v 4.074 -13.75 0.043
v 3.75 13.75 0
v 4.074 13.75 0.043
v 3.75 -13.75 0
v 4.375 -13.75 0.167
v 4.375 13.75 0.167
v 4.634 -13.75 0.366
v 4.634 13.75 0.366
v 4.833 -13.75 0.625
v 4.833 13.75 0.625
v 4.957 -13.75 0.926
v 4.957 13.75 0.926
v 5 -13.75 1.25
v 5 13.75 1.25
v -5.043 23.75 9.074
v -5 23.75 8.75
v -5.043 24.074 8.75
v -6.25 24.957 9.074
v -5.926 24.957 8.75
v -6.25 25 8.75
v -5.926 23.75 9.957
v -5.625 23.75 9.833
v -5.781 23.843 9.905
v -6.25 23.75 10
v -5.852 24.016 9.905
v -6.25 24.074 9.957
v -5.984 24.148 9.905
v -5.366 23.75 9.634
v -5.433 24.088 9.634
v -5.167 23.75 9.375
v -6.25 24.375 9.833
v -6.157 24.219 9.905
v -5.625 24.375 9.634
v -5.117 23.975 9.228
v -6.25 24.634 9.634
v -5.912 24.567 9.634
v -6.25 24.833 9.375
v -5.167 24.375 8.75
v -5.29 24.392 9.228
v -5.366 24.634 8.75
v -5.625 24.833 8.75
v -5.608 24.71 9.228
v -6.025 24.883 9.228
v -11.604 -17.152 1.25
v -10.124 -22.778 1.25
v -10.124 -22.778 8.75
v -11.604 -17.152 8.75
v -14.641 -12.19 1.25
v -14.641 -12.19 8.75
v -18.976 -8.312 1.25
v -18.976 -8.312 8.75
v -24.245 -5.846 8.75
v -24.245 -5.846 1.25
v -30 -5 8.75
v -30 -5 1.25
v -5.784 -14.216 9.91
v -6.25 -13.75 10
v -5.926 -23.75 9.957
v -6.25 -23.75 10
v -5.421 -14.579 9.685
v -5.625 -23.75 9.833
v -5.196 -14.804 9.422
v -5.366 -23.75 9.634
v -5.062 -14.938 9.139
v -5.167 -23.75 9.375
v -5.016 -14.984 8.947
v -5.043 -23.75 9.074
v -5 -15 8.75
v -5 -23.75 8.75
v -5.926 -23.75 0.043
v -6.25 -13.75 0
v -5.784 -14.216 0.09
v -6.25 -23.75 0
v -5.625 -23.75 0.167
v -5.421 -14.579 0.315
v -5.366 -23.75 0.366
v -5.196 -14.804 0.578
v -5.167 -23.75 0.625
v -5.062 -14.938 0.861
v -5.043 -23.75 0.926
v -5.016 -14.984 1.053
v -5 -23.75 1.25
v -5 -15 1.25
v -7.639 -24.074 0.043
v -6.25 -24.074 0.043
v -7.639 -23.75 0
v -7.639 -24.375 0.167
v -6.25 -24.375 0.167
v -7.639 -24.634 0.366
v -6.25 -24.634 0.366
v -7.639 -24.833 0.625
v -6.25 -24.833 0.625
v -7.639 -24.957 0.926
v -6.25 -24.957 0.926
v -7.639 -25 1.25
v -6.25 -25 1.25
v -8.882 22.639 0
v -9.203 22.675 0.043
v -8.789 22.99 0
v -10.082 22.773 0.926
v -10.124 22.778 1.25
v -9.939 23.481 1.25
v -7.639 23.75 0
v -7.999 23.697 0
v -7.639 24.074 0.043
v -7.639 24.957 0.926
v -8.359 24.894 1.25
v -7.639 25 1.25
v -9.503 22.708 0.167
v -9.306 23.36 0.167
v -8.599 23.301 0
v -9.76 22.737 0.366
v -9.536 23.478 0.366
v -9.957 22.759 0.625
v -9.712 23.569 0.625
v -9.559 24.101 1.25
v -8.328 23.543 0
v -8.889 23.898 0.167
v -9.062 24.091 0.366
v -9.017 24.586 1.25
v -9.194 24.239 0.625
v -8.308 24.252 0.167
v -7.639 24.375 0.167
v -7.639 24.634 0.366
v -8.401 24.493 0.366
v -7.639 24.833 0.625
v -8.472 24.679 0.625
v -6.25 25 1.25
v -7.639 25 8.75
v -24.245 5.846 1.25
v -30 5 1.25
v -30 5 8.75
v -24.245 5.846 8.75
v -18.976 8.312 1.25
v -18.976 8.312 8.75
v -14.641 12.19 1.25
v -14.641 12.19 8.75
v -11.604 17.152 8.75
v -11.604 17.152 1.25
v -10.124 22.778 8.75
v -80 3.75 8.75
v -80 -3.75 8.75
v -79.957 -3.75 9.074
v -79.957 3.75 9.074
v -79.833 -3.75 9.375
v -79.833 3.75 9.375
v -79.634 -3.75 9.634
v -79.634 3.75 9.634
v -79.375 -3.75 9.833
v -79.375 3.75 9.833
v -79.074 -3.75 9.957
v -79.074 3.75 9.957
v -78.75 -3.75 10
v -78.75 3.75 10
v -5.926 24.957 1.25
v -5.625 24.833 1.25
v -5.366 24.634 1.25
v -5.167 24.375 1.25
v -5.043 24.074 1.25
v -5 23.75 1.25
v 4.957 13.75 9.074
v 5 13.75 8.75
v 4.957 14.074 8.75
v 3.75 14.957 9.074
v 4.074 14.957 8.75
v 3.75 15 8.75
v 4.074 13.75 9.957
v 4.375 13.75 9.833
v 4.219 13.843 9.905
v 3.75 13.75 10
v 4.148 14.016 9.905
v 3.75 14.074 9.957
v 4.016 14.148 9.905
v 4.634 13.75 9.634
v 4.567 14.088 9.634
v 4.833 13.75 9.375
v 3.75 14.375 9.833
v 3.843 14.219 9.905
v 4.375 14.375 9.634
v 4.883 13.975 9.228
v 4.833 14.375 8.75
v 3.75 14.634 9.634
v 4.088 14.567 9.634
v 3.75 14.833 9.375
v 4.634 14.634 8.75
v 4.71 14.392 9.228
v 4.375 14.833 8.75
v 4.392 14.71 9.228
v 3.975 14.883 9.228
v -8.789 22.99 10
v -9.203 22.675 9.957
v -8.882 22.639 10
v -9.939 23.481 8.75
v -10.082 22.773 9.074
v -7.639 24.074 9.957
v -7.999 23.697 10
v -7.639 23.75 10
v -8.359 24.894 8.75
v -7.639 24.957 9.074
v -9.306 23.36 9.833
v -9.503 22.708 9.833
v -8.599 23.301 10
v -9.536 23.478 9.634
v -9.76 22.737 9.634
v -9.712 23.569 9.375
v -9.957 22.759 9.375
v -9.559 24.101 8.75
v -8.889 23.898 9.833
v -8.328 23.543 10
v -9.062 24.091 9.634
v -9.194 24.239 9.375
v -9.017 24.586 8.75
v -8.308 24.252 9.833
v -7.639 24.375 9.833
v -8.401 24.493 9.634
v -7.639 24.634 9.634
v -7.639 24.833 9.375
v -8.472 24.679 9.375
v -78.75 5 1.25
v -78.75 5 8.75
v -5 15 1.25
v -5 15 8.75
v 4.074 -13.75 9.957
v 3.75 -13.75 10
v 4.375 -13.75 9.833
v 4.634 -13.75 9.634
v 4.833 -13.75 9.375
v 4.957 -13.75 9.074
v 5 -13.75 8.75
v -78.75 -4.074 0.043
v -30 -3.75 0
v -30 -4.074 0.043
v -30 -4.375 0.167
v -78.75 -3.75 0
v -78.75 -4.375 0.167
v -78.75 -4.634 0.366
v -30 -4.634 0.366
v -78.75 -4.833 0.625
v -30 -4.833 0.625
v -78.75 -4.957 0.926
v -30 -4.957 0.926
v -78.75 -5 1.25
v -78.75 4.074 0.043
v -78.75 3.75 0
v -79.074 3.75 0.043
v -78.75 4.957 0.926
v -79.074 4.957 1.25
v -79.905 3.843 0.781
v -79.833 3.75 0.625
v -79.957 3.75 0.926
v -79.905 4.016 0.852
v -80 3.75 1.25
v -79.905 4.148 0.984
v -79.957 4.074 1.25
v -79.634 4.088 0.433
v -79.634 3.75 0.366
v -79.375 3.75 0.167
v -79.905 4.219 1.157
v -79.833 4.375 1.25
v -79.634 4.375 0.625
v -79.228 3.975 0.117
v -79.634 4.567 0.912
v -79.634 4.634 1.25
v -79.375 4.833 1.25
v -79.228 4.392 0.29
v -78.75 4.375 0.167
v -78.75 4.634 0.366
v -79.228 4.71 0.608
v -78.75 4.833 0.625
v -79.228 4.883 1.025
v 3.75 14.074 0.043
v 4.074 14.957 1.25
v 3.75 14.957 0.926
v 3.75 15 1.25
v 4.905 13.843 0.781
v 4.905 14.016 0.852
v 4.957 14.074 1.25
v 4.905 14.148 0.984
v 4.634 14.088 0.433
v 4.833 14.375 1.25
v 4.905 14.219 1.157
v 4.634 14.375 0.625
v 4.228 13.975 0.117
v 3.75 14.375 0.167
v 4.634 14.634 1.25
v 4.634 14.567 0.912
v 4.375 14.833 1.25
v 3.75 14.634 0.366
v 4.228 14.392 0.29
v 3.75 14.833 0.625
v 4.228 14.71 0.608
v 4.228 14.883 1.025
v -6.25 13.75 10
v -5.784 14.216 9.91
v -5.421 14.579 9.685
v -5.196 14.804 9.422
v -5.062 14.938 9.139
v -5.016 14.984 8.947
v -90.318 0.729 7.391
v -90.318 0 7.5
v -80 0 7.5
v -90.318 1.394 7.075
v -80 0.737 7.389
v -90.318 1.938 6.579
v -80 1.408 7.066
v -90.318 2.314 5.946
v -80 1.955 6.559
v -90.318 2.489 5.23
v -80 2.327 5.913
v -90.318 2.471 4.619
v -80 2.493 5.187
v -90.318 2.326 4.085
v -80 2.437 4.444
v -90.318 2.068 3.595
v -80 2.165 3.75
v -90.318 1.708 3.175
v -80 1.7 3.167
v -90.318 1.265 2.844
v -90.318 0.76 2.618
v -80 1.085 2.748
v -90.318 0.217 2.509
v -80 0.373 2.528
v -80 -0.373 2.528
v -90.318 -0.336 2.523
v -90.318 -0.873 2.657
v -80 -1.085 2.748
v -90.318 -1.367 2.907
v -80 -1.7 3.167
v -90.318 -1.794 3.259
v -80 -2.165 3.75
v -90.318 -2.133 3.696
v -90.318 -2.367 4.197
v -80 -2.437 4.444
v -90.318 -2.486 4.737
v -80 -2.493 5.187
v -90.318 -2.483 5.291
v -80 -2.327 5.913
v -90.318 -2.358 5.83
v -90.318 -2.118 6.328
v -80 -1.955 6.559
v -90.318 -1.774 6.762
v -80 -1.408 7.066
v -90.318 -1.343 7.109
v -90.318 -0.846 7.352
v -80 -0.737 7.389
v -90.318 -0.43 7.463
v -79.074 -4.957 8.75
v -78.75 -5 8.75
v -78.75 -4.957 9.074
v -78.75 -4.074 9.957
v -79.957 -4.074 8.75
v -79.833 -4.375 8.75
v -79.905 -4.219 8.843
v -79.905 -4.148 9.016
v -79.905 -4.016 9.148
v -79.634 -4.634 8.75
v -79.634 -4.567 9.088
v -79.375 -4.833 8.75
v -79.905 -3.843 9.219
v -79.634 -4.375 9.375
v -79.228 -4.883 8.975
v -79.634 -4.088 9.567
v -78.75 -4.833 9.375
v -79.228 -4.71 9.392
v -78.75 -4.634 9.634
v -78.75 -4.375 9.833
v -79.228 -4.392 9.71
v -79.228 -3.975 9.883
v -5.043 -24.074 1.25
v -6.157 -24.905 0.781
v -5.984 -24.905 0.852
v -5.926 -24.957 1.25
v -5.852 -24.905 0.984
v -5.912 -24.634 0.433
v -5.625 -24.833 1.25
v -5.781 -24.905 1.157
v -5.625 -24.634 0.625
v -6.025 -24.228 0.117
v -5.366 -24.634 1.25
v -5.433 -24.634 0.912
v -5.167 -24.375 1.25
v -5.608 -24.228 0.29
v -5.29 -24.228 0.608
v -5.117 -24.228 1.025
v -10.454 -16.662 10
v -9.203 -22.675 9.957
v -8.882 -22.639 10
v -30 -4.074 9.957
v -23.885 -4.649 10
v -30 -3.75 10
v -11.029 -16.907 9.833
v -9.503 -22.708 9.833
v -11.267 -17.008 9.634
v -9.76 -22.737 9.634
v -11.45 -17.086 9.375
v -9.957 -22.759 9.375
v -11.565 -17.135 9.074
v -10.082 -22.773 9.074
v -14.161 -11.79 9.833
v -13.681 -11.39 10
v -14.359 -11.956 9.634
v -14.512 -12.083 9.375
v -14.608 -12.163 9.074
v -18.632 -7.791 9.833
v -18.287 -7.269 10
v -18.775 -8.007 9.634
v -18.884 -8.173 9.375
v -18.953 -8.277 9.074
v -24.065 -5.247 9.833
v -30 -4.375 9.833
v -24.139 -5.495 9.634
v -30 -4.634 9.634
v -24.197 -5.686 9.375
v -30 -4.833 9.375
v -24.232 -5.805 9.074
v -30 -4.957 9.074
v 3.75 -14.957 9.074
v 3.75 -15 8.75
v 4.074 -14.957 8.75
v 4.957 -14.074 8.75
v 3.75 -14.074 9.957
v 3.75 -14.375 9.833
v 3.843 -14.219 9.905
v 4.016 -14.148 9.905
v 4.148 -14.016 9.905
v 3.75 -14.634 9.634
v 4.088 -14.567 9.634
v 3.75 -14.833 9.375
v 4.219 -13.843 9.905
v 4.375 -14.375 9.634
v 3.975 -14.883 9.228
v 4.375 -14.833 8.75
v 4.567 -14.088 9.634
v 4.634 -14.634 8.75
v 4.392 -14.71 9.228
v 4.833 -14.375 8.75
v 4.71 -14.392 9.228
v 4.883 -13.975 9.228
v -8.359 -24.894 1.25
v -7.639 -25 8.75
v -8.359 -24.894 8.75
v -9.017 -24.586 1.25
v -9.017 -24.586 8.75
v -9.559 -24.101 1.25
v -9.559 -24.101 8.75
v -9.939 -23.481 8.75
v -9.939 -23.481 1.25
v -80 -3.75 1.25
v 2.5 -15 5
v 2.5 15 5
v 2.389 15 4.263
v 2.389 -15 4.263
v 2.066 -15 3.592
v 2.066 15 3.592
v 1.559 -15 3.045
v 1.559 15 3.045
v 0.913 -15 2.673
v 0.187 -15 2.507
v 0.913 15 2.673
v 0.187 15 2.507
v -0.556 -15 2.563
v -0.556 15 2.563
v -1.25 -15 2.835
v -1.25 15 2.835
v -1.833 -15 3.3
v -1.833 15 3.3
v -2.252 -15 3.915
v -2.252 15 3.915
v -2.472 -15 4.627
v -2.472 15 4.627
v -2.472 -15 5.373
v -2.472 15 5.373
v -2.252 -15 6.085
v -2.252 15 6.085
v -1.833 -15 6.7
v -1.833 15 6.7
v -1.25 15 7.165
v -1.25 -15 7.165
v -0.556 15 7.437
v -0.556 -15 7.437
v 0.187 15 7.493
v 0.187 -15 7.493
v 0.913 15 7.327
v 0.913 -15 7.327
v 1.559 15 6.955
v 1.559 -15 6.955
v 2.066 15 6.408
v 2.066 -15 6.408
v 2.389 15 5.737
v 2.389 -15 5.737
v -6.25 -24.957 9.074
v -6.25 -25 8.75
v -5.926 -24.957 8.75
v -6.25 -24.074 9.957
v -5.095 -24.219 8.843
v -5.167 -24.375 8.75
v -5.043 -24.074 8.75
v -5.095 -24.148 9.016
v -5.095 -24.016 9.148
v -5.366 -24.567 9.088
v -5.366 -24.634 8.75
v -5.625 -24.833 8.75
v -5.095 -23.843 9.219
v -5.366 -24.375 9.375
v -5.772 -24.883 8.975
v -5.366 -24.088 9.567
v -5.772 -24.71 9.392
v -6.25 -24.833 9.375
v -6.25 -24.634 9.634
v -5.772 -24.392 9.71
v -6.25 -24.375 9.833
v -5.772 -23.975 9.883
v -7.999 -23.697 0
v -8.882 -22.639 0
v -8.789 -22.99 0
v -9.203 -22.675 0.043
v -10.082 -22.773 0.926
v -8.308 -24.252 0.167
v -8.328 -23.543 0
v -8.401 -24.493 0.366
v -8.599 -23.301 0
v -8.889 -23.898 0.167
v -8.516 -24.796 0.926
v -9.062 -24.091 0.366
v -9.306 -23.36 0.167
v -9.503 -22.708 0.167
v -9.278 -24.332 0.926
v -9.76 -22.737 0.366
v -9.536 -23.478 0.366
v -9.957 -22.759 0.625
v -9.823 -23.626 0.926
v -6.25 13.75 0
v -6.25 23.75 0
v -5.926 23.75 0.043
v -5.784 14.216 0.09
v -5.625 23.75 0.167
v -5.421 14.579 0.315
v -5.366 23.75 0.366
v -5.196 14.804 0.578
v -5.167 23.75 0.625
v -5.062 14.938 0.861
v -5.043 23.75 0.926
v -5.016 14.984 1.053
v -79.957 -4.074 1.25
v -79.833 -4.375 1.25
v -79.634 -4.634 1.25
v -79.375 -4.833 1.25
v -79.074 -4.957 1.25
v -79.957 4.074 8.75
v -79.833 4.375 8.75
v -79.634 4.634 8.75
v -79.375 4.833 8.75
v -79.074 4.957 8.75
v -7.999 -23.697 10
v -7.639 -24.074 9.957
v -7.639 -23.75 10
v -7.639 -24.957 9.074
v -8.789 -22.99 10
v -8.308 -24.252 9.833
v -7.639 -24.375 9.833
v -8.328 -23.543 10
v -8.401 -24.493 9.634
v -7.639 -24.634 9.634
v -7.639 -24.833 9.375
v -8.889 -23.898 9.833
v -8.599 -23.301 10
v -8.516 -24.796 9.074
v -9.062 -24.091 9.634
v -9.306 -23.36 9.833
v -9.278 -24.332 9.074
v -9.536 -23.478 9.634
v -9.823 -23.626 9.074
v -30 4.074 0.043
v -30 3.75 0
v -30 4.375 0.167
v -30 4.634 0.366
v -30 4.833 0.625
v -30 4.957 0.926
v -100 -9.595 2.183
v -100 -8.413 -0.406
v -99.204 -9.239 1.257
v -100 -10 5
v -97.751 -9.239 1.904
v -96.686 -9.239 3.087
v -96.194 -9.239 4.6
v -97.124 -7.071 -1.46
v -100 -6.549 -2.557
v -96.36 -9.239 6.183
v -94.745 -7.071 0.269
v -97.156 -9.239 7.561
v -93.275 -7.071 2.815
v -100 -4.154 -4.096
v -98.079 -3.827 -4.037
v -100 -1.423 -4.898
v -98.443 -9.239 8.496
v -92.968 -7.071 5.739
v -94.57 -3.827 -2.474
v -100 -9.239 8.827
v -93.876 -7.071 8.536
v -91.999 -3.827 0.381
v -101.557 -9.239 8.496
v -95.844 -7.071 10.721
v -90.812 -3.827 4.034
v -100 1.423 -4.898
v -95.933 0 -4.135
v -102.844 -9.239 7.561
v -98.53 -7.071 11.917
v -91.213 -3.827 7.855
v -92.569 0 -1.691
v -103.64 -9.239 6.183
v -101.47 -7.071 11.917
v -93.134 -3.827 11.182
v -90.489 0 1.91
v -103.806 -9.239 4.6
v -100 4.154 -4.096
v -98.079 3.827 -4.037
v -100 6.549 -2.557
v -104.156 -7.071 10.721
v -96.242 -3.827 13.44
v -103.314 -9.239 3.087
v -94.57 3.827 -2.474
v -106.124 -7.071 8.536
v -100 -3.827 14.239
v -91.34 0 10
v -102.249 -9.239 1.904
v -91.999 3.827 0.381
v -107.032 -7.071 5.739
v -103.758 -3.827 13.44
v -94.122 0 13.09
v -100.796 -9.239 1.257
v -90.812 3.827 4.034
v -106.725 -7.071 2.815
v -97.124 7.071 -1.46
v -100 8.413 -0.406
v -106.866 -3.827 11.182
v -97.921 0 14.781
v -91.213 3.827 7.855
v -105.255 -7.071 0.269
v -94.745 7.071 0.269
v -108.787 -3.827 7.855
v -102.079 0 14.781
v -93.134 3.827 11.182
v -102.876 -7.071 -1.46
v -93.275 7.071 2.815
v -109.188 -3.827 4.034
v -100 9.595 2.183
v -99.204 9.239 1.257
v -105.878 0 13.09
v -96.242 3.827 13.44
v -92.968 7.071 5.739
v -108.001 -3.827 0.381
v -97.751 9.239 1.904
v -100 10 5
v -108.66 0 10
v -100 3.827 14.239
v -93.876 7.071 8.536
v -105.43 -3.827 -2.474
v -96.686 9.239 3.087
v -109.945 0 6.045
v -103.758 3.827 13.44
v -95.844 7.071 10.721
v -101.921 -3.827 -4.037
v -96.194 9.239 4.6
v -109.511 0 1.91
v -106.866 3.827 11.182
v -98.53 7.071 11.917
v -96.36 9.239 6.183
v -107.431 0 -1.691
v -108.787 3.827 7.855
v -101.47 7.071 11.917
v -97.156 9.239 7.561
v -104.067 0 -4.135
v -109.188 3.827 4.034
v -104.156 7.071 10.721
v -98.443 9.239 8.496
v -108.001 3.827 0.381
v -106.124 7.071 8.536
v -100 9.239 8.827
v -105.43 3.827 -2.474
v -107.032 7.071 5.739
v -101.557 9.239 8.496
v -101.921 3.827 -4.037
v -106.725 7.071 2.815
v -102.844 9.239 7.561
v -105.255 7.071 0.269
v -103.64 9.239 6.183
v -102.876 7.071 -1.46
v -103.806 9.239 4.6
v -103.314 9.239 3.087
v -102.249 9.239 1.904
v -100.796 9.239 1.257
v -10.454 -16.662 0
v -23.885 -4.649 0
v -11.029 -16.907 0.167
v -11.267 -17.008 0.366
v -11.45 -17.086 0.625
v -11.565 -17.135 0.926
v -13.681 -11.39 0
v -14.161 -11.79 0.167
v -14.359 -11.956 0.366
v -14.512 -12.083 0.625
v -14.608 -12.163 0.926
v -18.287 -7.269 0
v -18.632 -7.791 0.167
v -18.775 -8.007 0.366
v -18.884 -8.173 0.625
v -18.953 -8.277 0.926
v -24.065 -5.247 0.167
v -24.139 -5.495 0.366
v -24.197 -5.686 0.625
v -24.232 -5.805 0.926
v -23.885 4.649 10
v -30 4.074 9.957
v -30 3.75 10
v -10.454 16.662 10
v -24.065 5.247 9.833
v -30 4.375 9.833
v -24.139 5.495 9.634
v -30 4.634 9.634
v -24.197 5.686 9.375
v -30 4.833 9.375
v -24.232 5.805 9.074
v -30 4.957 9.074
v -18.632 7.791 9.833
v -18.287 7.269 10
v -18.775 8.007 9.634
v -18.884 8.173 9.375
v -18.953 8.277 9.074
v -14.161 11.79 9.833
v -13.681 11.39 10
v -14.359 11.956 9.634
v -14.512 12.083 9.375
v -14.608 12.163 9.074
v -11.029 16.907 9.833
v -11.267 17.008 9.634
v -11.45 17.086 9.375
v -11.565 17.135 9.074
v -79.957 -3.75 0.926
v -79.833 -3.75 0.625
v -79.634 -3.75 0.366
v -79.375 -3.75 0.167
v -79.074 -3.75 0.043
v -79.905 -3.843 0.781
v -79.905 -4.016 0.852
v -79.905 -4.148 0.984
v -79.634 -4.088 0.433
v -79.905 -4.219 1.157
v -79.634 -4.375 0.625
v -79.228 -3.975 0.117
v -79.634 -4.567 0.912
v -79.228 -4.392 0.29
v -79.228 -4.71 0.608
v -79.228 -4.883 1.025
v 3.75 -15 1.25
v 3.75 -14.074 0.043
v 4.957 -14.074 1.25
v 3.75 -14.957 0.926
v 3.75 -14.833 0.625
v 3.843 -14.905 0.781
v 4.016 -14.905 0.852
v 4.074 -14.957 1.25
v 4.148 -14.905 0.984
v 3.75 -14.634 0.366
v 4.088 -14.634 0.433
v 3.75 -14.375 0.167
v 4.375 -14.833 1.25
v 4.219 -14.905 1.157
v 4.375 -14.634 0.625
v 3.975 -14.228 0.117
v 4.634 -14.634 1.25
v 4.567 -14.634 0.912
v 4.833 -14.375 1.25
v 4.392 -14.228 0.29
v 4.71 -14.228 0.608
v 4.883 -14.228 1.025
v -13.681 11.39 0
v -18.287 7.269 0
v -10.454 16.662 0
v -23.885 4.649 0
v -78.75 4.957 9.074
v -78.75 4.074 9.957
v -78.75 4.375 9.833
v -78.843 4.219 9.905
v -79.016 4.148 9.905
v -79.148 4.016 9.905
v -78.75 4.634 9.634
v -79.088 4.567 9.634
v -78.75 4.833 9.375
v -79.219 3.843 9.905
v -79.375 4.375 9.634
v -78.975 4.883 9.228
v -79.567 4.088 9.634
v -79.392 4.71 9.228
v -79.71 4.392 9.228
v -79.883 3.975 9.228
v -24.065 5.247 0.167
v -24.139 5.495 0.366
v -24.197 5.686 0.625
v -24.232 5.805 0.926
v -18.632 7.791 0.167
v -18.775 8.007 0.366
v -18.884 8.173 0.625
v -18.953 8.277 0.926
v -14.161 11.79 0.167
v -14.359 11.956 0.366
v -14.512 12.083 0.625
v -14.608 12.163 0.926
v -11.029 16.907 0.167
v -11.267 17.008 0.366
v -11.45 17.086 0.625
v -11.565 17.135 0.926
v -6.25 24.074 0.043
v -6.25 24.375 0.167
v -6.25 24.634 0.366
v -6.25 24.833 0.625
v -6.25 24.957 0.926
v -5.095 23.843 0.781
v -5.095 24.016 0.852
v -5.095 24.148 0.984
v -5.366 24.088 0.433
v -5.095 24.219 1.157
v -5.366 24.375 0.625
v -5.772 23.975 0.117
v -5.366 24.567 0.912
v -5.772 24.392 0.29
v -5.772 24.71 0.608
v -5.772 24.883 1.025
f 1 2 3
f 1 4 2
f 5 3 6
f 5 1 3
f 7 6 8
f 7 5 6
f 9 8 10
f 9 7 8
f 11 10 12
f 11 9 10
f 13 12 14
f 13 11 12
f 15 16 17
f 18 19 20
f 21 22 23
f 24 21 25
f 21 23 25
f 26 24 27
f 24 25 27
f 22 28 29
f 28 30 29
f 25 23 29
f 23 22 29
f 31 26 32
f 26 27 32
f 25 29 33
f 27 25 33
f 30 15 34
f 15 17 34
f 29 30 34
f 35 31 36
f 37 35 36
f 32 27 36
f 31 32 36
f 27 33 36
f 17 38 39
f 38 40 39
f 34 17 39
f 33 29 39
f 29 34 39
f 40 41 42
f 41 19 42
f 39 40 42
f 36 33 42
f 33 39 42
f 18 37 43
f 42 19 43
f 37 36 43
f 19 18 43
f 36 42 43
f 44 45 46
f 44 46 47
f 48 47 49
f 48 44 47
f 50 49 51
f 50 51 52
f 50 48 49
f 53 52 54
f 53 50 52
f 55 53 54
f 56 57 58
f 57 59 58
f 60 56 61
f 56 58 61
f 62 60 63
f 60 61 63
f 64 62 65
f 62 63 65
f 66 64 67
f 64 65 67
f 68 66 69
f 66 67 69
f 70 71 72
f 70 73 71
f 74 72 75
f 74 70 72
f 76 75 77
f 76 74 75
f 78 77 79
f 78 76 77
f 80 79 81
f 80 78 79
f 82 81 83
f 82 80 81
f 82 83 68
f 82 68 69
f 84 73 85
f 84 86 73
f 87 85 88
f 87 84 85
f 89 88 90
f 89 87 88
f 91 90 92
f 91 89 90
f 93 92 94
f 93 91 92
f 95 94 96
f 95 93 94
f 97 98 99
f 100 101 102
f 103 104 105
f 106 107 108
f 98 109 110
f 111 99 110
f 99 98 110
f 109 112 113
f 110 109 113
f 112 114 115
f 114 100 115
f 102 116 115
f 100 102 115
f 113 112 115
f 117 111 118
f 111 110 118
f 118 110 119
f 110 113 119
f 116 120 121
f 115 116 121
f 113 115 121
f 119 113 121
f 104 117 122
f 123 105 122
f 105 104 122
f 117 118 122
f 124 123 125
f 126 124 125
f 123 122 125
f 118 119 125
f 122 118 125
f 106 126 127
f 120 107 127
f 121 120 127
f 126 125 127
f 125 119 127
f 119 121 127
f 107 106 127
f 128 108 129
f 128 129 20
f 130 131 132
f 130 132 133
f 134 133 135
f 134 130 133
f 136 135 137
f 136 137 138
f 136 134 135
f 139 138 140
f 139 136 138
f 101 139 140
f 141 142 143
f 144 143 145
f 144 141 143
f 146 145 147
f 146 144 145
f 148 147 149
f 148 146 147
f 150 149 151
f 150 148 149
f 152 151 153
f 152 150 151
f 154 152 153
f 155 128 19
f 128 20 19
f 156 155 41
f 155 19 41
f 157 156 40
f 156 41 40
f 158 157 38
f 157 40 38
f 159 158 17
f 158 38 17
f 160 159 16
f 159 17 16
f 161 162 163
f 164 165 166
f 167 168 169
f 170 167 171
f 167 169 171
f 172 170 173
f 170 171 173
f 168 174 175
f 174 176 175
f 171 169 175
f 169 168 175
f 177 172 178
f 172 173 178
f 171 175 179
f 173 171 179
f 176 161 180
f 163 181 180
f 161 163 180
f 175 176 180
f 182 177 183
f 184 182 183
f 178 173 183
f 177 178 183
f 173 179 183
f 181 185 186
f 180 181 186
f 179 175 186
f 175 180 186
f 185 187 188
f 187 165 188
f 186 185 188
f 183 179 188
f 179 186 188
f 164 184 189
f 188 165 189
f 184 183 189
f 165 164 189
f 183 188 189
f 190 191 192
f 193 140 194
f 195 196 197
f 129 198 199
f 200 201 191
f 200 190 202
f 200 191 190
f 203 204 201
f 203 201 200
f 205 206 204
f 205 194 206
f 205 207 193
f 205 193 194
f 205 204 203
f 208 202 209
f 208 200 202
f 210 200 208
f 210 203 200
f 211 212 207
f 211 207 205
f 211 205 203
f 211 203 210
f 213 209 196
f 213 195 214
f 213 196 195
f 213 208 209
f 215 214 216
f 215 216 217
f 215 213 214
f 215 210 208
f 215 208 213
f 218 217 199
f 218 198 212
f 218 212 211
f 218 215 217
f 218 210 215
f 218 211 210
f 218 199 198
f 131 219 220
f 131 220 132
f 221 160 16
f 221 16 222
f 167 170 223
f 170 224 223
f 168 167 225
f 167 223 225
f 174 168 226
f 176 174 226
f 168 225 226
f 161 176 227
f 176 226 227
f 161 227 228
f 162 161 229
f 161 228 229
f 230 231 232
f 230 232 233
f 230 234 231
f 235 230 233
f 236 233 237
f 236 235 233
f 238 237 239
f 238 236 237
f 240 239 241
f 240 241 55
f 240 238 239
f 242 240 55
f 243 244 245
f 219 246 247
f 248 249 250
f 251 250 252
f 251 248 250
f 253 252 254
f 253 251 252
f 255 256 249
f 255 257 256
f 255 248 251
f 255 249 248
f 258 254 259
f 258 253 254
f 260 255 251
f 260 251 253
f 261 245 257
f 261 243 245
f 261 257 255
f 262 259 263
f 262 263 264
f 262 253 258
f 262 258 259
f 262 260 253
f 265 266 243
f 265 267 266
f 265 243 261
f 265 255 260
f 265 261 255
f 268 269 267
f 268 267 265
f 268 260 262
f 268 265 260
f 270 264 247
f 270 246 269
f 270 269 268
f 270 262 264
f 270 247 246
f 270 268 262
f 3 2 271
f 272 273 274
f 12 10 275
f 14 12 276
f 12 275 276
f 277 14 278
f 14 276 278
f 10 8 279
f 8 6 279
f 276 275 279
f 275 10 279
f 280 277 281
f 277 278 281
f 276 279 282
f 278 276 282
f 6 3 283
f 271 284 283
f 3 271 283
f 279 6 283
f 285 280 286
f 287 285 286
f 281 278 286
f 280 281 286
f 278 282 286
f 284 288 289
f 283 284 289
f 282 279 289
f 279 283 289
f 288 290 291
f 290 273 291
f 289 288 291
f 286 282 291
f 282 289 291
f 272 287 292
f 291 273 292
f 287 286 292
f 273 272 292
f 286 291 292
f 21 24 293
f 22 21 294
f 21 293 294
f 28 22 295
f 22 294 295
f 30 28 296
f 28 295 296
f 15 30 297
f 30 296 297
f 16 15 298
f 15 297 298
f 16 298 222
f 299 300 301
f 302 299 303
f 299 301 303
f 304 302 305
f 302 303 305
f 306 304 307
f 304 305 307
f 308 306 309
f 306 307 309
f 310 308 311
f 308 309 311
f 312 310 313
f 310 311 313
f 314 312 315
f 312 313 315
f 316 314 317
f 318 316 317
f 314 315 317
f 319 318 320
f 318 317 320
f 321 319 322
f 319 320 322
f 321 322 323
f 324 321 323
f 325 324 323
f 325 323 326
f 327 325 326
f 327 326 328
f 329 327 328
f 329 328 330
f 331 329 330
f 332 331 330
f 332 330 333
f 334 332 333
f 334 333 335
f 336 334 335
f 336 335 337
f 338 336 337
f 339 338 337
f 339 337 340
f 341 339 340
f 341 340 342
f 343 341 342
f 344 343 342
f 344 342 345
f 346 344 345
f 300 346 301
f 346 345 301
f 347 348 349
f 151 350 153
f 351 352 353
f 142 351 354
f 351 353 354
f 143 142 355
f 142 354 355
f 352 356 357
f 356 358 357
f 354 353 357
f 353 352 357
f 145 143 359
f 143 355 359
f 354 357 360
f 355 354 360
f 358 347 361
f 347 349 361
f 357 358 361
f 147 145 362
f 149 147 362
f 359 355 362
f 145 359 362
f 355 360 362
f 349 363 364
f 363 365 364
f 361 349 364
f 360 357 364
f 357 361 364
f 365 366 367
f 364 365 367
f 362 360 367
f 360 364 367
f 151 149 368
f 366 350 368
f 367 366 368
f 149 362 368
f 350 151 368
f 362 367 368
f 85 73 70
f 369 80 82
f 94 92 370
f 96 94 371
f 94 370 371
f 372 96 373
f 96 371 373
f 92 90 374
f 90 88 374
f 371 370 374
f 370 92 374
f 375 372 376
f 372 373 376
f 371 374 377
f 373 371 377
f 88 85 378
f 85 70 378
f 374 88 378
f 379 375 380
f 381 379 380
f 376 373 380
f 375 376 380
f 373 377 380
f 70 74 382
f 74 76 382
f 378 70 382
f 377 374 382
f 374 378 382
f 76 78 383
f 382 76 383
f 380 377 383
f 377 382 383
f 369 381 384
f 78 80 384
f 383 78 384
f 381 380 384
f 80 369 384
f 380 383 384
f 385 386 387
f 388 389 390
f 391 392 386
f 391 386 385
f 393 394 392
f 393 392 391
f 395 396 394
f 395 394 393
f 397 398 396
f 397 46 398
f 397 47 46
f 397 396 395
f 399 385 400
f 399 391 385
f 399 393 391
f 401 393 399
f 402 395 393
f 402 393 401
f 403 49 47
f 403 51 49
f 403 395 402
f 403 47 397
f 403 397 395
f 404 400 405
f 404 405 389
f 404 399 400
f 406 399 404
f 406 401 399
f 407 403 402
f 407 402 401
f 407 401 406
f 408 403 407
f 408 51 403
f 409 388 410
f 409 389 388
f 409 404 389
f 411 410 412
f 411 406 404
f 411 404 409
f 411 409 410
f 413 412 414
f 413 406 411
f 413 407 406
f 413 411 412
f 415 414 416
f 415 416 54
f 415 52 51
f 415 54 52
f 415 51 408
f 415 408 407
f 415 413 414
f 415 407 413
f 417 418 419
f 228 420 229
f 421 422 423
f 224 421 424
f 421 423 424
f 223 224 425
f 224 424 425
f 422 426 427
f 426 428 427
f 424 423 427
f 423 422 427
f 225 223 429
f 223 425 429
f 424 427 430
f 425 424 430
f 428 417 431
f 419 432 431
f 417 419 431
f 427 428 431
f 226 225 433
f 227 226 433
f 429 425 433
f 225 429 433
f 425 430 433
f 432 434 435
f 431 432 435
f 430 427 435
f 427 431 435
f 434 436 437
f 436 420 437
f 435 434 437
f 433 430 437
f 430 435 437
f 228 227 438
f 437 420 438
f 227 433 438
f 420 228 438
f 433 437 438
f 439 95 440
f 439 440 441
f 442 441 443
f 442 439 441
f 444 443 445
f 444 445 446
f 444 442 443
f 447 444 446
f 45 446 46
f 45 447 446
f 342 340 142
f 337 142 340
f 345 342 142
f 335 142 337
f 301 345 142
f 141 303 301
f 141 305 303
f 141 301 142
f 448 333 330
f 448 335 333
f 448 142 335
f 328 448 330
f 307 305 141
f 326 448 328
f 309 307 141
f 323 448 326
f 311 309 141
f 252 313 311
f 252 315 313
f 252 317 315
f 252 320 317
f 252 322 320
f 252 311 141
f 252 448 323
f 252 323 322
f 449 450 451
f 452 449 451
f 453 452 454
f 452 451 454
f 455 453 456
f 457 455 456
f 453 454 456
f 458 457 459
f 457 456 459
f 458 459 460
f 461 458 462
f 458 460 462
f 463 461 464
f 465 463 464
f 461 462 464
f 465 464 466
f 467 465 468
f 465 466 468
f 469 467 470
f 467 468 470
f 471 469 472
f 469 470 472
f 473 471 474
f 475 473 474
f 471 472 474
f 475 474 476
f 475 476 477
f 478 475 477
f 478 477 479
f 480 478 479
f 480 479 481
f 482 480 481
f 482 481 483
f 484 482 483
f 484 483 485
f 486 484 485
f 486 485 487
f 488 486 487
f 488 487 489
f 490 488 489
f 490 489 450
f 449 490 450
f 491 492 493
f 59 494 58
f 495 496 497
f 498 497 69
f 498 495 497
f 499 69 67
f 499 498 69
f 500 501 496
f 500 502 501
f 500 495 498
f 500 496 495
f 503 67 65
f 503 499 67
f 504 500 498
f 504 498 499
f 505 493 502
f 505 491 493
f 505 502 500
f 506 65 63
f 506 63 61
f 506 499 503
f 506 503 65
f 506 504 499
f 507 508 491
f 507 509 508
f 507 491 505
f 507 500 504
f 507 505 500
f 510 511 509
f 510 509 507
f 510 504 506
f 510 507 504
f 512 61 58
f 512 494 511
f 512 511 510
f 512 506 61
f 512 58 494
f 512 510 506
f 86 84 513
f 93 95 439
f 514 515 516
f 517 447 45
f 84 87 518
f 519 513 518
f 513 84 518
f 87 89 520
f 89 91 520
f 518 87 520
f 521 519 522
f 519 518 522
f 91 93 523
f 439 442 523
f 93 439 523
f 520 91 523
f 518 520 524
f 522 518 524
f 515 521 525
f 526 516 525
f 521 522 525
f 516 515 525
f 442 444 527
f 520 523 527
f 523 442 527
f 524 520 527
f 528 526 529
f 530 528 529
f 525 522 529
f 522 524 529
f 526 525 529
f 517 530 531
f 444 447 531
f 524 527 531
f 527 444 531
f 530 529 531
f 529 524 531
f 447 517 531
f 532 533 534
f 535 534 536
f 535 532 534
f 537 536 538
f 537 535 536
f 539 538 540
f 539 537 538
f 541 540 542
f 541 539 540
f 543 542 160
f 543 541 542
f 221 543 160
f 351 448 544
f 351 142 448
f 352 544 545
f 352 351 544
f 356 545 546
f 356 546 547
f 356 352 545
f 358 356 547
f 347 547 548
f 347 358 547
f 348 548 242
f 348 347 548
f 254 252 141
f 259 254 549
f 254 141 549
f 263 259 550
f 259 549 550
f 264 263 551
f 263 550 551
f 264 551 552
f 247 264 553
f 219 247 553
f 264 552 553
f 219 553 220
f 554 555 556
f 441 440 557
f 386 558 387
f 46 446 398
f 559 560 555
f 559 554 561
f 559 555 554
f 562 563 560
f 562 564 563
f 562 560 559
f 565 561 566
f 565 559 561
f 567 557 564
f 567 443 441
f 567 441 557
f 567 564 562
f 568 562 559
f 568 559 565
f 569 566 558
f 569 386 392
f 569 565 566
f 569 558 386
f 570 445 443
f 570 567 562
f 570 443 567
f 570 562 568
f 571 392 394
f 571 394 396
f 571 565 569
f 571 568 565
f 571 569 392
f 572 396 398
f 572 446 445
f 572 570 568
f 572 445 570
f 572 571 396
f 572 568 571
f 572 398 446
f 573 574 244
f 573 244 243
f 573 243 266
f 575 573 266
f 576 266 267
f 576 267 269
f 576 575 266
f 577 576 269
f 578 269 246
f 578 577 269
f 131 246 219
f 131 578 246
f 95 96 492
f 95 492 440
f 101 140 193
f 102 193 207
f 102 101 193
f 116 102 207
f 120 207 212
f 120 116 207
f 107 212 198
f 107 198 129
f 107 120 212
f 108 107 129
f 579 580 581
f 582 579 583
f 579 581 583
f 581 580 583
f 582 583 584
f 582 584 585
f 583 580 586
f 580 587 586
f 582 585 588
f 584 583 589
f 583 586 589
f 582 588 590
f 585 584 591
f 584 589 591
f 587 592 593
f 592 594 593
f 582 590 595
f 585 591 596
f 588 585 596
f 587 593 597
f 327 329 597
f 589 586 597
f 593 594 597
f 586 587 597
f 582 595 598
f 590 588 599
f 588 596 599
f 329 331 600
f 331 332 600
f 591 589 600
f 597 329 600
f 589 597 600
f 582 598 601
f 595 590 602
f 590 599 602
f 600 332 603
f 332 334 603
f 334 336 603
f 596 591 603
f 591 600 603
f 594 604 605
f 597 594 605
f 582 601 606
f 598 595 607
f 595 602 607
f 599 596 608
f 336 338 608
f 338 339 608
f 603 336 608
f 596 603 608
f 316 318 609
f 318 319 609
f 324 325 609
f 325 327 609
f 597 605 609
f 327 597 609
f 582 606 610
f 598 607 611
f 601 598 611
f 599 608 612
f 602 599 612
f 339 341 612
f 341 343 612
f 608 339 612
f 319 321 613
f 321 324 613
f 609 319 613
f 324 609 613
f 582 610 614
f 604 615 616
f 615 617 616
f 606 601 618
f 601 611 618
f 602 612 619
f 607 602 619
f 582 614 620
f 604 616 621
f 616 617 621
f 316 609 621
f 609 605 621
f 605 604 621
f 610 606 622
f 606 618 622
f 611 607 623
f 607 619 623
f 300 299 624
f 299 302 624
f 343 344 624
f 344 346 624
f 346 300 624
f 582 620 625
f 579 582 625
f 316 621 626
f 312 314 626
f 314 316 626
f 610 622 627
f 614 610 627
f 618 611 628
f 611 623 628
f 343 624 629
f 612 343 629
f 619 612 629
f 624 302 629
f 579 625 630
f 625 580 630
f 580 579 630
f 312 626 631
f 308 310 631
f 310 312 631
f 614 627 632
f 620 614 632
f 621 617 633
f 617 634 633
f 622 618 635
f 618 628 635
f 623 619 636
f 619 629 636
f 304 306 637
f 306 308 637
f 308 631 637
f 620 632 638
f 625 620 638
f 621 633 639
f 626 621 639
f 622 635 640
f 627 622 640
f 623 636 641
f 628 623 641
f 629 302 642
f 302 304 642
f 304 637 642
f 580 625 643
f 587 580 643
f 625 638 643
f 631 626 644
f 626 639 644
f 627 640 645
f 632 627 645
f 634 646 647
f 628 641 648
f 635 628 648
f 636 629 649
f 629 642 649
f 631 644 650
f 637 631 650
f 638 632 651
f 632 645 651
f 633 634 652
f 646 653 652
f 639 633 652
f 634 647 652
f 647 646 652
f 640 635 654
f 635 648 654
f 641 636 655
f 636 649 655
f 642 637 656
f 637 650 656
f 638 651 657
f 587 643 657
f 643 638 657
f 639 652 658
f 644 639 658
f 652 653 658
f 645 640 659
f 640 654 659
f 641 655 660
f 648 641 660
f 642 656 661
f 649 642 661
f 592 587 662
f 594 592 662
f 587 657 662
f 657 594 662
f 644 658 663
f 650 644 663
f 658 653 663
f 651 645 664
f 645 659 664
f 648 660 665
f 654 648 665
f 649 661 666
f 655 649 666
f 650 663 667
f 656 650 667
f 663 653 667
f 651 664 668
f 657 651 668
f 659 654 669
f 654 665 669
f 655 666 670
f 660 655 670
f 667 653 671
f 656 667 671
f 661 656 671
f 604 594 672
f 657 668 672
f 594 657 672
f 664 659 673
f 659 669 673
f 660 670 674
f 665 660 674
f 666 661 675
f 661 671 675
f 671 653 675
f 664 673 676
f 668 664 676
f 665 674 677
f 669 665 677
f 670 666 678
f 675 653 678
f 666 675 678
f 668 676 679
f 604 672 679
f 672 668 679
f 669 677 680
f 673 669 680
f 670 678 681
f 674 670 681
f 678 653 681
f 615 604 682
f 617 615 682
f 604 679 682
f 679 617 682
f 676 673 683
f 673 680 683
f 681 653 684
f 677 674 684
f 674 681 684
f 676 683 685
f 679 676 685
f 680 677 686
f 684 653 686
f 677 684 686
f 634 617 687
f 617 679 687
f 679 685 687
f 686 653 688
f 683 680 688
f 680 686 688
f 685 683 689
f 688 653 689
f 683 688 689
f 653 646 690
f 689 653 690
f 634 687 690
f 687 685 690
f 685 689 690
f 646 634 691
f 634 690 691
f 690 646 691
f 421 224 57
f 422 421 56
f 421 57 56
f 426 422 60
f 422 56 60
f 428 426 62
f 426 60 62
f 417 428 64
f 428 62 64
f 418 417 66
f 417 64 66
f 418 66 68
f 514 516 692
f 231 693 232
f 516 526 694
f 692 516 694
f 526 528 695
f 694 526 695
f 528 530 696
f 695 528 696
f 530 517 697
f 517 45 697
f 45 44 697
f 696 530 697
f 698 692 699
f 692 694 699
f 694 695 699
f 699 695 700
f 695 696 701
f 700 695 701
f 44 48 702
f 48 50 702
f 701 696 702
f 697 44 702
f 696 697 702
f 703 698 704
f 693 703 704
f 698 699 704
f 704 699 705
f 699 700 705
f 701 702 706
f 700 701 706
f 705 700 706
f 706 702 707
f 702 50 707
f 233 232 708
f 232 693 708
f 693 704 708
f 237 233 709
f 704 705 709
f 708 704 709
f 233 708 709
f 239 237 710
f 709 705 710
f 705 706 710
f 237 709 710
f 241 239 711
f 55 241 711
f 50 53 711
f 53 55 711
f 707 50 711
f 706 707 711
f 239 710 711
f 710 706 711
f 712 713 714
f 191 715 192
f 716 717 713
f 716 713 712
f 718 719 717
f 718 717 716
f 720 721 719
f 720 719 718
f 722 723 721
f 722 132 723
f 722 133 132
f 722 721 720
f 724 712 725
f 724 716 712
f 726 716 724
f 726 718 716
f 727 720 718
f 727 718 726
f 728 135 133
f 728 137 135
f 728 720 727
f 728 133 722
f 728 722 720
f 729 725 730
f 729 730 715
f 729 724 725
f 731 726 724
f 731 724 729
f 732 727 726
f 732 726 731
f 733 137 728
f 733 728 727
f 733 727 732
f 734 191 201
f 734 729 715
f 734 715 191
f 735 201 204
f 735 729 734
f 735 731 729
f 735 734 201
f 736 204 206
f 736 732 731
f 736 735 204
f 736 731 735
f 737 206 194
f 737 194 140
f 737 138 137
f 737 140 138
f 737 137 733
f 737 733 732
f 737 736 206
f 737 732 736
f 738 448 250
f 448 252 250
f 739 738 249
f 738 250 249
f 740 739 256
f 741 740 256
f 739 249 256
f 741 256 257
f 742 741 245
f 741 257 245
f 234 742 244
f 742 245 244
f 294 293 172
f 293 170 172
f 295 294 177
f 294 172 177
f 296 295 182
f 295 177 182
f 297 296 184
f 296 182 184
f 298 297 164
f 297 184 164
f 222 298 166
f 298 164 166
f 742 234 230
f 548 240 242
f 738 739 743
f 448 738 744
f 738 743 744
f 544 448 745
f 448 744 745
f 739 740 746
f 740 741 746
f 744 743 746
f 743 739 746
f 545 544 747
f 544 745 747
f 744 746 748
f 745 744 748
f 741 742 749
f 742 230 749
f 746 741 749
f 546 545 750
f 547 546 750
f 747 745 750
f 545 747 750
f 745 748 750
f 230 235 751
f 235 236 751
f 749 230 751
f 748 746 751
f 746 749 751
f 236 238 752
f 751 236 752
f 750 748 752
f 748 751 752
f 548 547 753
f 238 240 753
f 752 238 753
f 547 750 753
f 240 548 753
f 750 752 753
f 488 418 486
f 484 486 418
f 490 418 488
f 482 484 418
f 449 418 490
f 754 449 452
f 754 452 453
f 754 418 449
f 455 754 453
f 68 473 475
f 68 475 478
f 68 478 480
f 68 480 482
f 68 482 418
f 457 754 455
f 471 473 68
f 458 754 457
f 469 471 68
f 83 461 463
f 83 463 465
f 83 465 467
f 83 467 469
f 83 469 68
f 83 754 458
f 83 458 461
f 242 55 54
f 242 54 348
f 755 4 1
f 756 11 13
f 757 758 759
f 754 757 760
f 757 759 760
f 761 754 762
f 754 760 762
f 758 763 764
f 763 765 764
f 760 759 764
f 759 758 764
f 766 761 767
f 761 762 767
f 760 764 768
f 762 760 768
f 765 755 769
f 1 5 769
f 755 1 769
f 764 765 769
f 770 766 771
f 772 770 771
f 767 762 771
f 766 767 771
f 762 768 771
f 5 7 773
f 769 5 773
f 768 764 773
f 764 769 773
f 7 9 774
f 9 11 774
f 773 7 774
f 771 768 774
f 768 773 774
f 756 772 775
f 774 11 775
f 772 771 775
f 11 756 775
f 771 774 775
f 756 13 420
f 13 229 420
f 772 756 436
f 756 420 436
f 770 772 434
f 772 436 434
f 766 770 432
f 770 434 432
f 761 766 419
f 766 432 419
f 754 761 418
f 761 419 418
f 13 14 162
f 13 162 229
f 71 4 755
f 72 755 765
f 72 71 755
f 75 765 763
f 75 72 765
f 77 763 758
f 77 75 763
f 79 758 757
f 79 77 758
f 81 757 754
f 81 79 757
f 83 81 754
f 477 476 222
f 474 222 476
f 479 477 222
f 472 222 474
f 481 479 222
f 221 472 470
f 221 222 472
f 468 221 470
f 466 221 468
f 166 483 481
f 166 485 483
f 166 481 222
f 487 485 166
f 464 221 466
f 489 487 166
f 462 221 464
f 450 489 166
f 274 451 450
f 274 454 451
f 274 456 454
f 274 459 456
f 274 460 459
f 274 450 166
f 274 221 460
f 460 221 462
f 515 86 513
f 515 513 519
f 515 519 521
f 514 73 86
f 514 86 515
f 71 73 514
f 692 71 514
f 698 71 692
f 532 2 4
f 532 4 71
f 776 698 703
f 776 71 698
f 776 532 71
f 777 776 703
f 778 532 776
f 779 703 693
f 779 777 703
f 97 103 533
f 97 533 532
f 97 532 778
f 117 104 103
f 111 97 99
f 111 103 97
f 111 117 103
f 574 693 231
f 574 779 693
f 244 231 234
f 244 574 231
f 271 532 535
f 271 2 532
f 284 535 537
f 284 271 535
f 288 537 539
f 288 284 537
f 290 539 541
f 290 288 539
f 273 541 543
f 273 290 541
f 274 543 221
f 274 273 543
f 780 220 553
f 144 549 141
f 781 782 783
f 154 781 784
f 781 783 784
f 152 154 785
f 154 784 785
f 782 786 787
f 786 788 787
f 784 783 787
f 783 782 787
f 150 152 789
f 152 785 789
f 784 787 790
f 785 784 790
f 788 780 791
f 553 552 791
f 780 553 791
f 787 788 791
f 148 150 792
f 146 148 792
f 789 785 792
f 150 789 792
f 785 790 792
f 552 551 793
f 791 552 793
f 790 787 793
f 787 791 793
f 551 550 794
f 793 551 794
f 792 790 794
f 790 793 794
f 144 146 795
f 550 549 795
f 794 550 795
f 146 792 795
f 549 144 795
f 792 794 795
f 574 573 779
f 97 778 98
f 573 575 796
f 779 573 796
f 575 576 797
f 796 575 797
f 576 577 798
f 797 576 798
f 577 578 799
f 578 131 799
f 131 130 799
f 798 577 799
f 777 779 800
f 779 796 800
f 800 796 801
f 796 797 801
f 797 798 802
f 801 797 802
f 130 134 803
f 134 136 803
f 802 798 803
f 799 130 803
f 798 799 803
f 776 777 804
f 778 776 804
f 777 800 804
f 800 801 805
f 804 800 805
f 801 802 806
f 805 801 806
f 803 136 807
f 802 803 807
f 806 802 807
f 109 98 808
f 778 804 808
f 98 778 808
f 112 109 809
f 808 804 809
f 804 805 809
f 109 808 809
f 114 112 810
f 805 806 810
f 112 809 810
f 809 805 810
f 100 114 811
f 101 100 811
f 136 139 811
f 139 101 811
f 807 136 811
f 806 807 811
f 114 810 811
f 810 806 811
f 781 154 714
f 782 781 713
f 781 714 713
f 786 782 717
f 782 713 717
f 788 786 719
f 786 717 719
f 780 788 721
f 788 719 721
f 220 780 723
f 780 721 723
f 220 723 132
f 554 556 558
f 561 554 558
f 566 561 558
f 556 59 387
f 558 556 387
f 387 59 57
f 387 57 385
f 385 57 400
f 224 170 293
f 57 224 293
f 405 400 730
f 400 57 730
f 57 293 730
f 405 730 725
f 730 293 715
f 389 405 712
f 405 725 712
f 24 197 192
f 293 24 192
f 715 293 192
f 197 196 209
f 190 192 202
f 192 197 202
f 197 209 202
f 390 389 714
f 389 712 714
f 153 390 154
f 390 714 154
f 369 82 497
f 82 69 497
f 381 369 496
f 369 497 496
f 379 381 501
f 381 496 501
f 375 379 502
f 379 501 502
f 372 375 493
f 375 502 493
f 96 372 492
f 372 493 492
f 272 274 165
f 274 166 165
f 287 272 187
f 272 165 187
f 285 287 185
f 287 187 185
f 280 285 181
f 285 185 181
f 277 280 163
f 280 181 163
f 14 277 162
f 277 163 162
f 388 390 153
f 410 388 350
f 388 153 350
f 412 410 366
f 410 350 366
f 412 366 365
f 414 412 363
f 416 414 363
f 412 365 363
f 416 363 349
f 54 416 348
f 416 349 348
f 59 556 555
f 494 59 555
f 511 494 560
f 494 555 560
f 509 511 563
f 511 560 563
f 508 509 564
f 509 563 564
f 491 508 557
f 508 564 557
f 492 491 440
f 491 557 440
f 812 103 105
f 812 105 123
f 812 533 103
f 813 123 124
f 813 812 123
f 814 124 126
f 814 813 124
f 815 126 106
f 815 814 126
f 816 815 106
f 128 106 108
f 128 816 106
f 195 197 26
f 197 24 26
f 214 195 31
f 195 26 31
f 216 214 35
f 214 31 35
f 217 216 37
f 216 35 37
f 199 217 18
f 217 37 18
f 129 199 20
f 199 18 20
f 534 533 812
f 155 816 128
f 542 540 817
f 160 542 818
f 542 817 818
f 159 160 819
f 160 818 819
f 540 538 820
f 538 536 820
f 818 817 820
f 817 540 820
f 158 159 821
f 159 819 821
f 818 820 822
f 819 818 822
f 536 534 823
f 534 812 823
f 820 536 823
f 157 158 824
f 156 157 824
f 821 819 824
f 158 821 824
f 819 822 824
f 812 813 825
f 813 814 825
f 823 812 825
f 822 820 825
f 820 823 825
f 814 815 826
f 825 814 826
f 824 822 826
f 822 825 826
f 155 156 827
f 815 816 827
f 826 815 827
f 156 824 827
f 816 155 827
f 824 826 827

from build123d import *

# Parameters (mm, degrees)
BOSS_EXTRUDE2_DEPTH = 10
SKETCH2_R           = 2.5
BOSS_EXTRUDE3_DEPTH = 20
SKETCH4_R           = 2.5
CUT_EXTRUDE1_DEPTH  = 41
FILLET1_R           = 1.25


with BuildPart() as part:
    # Sketch1 → Boss-Extrude2 (new body)
    with BuildSketch(Plane.XY):
        with BuildLine():
            Line((-80, 5), (-30, 5))
            ThreePointArc((-30, 5), (-16.666666667, 10.09288015), (-10.1238402, 22.777777778))
            ThreePointArc((-10.1238402, 22.777777778), (-9.305986892, 24.363389981), (-7.639320225, 25))
            Line((-7.639320225, 25), (-5, 25))
            Line((-5, 25), (-5, 15))
            Line((-5, 15), (5, 15))
            Line((5, 15), (5, -15))
            Line((5, -15), (-5, -15))
            Line((-5, -15), (-5, -25))
            Line((-5, -25), (-7.639320225, -25))
            ThreePointArc((-7.639320225, -25), (-9.305986892, -24.363389981), (-10.1238402, -22.777777778))
            ThreePointArc((-10.1238402, -22.777777778), (-16.666666667, -10.09288015), (-30, -5))
            Line((-30, -5), (-80, -5))
            Line((-80, -5), (-80, 5))
        make_face()
    extrude(amount=BOSS_EXTRUDE2_DEPTH)

    # Sketch2 → Boss-Extrude3 (add)
    with BuildSketch(Plane.ZY.offset(80)):
        with Locations((5, 0)):
            Circle(SKETCH2_R)
    extrude(amount=BOSS_EXTRUDE3_DEPTH)

    # Sketch3 → Revolve1 (revolve)
    with BuildSketch(Plane.ZY.offset(100)):
        with BuildLine():
            Line((5, 10), (5, -10))
            ThreePointArc((5, -10), (-5, 0), (5, 10))
        make_face()
    revolve(axis=Axis((-100, 10, 5), (0, -1, 0)))

    # Sketch4 → Cut-Extrude1 (cut, through all)
    with BuildSketch(Plane(origin=(0, 15, 0), x_dir=(1, 0, 0), z_dir=(0, 1, 0))):
        with Locations((0, -5)):
            Circle(SKETCH4_R)
    extrude(amount=-CUT_EXTRUDE1_DEPTH, mode=Mode.SUBTRACT)

    # Fillet1
    fillet1_edges = [part.edges().sort_by_distance(p)[0] for p in [
        (-16.666666667, -10.09288015, 10),
        (-55, 5, 0),
        (-16.666666667, 10.09288015, 0),
        (-9.305986892, 24.363389981, 0),
        (-6.319660113, 25, 0),
        (-5, 20, 0),
        (0, 15, 0),
        (5, 0, 0),
        (0, -15, 0),
        (-9.305986892, -24.363389981, 10),
        (-5, -20, 0),
        (-6.319660113, -25, 0),
        (-9.305986892, -24.363389981, 0),
        (-16.666666667, -10.09288015, 0),
        (-55, -5, 0),
        (-80, 0, 0),
        (-6.319660113, -25, 10),
        (-80, 5, 5),
        (-5, 25, 5),
        (5, 15, 5),
        (5, -15, 5),
        (-5, -25, 5),
        (-5, -20, 10),
        (-80, -5, 5),
        (0, -15, 10),
        (5, 0, 10),
        (0, 15, 10),
        (-5, 20, 10),
        (-6.319660113, 25, 10),
        (-9.305986892, 24.363389981, 10),
        (-80, 0, 10),
        (-16.666666667, 10.09288015, 10),
        (-55, 5, 10),
        (-55, -5, 10),
    ]]
    fillet(fillet1_edges, radius=FILLET1_R)


solid = part.part
